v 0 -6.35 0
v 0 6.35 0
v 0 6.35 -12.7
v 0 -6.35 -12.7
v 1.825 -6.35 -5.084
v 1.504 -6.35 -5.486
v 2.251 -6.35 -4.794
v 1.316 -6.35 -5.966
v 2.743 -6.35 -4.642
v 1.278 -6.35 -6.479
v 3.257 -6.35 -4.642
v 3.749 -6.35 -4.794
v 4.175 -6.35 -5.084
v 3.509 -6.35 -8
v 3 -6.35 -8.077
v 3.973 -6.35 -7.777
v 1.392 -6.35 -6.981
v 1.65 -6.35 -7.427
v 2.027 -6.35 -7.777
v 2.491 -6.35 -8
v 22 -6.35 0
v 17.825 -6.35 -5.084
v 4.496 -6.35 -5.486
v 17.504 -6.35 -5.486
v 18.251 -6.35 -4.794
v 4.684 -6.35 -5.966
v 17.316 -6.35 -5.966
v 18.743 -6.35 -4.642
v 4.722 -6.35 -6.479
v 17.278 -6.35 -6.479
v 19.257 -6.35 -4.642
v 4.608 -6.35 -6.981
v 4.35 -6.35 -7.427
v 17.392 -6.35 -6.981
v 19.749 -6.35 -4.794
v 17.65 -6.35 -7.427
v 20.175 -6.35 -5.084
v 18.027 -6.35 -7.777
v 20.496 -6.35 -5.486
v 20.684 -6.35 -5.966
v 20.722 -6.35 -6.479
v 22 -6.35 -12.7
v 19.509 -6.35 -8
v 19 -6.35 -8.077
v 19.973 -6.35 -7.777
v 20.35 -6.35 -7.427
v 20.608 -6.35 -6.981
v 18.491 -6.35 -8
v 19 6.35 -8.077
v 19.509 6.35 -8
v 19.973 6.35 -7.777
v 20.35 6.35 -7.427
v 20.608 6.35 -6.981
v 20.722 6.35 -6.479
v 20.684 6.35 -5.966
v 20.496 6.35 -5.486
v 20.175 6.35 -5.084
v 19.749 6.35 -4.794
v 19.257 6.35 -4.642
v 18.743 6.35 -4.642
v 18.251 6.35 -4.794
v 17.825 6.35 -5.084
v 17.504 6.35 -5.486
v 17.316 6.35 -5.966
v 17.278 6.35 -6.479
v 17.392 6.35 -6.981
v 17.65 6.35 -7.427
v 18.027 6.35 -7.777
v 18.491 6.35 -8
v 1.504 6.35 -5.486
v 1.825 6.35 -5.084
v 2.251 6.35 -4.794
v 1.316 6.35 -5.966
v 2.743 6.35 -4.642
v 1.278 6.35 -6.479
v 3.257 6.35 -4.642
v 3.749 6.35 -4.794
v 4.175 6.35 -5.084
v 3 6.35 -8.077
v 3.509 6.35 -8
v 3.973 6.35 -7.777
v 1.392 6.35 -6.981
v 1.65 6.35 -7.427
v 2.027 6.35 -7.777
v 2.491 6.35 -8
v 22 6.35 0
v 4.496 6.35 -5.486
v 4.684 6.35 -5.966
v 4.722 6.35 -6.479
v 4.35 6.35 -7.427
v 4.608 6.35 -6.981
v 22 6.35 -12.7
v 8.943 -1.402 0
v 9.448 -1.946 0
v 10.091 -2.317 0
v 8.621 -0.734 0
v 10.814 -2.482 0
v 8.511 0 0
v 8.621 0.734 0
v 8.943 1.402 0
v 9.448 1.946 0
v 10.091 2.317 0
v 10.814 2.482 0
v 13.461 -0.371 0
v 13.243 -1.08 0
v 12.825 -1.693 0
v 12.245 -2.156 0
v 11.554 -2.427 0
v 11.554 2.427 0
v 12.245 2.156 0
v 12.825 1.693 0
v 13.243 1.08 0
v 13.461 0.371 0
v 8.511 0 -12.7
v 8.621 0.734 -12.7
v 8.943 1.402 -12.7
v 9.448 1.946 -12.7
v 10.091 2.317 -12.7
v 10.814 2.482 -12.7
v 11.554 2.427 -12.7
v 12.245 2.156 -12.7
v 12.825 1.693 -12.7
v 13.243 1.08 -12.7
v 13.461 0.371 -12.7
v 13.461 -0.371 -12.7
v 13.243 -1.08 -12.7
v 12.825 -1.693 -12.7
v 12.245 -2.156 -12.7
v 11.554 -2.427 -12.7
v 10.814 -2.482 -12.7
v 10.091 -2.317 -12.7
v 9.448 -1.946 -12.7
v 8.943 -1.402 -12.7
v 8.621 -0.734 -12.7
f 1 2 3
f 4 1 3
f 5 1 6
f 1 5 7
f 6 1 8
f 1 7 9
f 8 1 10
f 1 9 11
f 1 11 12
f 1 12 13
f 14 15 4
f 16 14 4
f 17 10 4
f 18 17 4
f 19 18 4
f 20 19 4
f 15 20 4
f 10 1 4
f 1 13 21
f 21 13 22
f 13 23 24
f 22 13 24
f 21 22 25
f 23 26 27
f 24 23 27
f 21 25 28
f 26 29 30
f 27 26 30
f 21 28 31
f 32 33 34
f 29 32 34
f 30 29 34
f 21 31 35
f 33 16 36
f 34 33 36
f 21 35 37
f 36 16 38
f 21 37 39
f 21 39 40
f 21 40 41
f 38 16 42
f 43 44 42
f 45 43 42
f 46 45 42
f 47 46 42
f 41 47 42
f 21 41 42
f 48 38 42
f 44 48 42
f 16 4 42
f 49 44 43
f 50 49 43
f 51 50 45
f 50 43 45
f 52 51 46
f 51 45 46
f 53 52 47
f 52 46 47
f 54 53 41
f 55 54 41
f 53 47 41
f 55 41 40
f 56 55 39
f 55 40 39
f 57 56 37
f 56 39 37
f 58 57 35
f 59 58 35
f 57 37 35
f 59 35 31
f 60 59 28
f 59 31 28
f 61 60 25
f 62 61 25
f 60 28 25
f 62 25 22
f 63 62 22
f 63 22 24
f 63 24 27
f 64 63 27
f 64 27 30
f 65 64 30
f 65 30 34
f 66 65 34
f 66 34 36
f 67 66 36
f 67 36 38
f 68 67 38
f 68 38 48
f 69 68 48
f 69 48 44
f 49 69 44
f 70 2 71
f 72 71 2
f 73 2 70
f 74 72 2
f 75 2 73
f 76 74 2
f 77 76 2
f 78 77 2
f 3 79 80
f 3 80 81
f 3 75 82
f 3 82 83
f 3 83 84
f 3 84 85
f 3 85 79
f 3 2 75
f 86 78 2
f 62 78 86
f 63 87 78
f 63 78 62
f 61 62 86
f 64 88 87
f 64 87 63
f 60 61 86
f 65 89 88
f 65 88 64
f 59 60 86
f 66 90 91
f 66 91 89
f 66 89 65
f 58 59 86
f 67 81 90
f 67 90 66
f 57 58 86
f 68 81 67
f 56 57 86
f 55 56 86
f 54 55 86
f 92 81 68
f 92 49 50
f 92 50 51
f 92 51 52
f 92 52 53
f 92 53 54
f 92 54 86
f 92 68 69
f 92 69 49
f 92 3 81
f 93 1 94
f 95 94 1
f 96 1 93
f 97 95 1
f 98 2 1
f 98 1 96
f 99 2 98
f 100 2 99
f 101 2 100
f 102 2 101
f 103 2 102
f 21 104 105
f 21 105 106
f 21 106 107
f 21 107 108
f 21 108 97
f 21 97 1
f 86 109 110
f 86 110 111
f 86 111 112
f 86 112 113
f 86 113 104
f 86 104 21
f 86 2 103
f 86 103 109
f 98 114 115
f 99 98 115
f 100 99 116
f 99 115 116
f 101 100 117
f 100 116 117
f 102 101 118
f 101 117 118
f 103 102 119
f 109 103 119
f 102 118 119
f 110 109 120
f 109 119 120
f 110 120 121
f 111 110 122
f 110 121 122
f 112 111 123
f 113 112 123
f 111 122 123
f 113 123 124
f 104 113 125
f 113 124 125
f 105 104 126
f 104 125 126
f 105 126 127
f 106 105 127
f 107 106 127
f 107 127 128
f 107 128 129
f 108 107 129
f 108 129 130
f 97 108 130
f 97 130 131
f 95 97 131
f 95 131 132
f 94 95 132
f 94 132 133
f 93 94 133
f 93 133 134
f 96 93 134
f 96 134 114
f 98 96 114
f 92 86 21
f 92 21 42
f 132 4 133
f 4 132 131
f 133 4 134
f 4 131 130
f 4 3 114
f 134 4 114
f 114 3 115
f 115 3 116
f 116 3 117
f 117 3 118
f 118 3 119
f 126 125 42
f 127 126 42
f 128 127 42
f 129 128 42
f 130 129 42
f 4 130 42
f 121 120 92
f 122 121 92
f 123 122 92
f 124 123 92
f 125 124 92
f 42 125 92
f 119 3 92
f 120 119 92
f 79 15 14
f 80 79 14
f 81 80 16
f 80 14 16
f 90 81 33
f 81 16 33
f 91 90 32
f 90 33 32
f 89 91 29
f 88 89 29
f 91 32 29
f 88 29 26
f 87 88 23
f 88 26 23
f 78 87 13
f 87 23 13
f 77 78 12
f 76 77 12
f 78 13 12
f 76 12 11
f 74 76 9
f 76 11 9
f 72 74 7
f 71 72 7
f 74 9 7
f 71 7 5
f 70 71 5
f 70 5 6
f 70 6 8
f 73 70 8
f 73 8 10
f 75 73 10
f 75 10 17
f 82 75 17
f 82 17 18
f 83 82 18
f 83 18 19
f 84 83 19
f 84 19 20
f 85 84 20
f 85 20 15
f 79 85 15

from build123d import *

# Parameters (mm, degrees)
SKETCH1_W             = 22.000000096
SKETCH1_H             = 12.7
BOSS_EXTRUDE1_DEPTH   = 6.35
F_8_32_TAPPED_HOLE1_D = 3.4544
SKETCH4_R             = 2.4892
CUT_EXTRUDE1_DEPTH    = 27.184203334


with BuildPart() as part:
    # Sketch1 → Boss-Extrude1 (new, symmetric)
    with BuildSketch(Plane(origin=(0, 0, 0), x_dir=(1, 0, 0), z_dir=(0, 1, 0))):
        with Locations((11.000000048, 6.35)):
            Rectangle(SKETCH1_W, SKETCH1_H)
    extrude(amount=BOSS_EXTRUDE1_DEPTH, both=True)

    # #8-32 Tapped Hole1 (through all)
    with Locations(Plane(origin=(3.000000096, 6.35, -6.35), x_dir=(0, 0, 1), z_dir=(0, 1, 0))):
        with Locations((0, 0), (0, 16)):
            Hole(F_8_32_TAPPED_HOLE1_D / 2)

    # Sketch4 → Cut-Extrude1 (cut, through all)
    with BuildSketch(Plane(origin=(0, 0, -12.7), x_dir=(-1, 0, 0), z_dir=(0, 0, -1))):
        with Locations((-11.000000048, 0)):
            Circle(SKETCH4_R)
    extrude(amount=-CUT_EXTRUDE1_DEPTH, mode=Mode.SUBTRACT)


solid = part.part
